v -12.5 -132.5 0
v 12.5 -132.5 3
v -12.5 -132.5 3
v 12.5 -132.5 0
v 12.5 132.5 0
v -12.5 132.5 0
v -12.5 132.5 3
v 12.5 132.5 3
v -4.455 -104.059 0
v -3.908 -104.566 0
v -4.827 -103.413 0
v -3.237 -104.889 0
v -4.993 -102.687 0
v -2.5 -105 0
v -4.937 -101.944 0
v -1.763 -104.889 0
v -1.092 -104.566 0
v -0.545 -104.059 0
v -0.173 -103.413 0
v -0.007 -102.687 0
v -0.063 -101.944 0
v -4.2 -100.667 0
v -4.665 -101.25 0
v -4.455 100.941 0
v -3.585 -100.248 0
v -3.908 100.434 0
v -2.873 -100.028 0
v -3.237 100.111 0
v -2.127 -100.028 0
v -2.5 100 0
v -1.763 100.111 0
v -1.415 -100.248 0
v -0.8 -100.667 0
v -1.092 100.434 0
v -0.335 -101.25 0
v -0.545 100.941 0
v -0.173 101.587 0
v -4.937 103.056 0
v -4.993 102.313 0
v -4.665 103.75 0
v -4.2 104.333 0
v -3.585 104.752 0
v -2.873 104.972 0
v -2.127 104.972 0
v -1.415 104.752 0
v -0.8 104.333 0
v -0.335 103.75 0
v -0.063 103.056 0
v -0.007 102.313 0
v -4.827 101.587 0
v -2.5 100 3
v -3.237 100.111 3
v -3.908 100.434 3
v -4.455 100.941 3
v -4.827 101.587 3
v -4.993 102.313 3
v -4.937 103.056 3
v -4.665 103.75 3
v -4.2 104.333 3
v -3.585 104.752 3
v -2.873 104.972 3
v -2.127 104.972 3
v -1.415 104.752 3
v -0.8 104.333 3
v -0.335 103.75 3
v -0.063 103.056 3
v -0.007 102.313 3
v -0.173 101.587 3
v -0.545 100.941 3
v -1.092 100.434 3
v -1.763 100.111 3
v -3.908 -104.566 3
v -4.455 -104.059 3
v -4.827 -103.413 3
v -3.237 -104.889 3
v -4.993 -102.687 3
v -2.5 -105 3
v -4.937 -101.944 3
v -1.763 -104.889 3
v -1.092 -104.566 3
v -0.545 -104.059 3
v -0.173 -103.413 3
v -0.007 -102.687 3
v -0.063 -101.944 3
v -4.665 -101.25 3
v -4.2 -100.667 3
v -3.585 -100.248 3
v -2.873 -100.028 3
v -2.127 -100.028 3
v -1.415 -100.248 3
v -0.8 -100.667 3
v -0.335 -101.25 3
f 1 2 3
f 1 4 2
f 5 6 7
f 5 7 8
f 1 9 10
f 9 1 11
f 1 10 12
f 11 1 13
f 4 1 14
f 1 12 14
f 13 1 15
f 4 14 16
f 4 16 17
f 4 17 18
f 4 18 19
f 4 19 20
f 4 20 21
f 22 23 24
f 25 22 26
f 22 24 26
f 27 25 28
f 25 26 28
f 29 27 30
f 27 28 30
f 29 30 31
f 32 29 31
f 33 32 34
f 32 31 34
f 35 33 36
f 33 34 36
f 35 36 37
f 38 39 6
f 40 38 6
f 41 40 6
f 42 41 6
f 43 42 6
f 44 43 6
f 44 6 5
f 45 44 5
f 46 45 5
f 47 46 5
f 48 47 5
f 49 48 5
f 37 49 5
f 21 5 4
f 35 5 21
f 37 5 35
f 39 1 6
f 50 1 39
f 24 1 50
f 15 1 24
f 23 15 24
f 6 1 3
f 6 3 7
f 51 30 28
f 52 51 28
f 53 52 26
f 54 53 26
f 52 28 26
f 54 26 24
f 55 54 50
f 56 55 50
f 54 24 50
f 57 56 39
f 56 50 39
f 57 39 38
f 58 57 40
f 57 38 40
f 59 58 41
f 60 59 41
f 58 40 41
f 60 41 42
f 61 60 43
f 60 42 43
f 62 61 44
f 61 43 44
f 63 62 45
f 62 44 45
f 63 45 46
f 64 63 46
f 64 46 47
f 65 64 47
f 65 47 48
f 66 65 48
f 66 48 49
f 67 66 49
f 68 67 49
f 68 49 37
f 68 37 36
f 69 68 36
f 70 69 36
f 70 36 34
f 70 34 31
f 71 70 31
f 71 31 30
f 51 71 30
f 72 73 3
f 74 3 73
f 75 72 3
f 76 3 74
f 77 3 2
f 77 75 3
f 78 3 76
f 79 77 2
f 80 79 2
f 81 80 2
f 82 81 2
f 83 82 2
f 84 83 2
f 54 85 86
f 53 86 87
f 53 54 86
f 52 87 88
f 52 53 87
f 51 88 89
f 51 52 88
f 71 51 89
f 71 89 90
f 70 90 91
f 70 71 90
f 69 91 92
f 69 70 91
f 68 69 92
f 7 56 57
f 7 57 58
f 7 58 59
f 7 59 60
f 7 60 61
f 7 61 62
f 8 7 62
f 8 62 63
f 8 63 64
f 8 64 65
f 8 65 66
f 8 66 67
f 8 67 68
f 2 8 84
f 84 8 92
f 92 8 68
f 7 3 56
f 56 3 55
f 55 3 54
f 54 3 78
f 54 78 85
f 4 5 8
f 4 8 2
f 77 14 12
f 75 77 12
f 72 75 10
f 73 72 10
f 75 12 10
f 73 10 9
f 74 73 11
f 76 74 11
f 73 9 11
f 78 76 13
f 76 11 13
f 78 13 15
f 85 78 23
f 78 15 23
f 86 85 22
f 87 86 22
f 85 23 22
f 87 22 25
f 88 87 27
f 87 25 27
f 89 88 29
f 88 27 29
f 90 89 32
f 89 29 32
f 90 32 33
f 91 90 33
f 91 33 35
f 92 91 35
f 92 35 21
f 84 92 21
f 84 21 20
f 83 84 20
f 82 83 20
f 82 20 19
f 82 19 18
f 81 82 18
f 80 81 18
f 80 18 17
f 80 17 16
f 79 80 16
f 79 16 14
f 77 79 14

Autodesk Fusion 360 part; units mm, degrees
sketch "Sketch1" plane through (0, 0, 0) normal (0, 0, 1) x (1, 0, 0)
  line L0 (12.5, -132.5) -> (-12.5, -132.5)
  line L1 (-12.5, -132.5) -> (-12.5, 132.5)
  line L2 (-12.5, 132.5) -> (12.5, 132.5)
  line L3 (12.5, 132.5) -> (12.5, -132.5)
  line L4 (12.5, -132.5) -> (-12.5, 132.5) construction
  line L5 (-12.5, -132.5) -> (12.5, 132.5) construction
  dimension "d1" = 25
  dimension "d2" = 265
extrude "Extrude1" add sketch "Sketch1" along normal blind 3
hole "Hole1" at (-2.5, 92.5, 3) direction (0, 0, -1) diameter 5 depth 65 tip angle 118
hole "Hole2" at (-2.5, -92.5, 3) direction (0, 0, -1) diameter 5 depth 65 tip angle 118
